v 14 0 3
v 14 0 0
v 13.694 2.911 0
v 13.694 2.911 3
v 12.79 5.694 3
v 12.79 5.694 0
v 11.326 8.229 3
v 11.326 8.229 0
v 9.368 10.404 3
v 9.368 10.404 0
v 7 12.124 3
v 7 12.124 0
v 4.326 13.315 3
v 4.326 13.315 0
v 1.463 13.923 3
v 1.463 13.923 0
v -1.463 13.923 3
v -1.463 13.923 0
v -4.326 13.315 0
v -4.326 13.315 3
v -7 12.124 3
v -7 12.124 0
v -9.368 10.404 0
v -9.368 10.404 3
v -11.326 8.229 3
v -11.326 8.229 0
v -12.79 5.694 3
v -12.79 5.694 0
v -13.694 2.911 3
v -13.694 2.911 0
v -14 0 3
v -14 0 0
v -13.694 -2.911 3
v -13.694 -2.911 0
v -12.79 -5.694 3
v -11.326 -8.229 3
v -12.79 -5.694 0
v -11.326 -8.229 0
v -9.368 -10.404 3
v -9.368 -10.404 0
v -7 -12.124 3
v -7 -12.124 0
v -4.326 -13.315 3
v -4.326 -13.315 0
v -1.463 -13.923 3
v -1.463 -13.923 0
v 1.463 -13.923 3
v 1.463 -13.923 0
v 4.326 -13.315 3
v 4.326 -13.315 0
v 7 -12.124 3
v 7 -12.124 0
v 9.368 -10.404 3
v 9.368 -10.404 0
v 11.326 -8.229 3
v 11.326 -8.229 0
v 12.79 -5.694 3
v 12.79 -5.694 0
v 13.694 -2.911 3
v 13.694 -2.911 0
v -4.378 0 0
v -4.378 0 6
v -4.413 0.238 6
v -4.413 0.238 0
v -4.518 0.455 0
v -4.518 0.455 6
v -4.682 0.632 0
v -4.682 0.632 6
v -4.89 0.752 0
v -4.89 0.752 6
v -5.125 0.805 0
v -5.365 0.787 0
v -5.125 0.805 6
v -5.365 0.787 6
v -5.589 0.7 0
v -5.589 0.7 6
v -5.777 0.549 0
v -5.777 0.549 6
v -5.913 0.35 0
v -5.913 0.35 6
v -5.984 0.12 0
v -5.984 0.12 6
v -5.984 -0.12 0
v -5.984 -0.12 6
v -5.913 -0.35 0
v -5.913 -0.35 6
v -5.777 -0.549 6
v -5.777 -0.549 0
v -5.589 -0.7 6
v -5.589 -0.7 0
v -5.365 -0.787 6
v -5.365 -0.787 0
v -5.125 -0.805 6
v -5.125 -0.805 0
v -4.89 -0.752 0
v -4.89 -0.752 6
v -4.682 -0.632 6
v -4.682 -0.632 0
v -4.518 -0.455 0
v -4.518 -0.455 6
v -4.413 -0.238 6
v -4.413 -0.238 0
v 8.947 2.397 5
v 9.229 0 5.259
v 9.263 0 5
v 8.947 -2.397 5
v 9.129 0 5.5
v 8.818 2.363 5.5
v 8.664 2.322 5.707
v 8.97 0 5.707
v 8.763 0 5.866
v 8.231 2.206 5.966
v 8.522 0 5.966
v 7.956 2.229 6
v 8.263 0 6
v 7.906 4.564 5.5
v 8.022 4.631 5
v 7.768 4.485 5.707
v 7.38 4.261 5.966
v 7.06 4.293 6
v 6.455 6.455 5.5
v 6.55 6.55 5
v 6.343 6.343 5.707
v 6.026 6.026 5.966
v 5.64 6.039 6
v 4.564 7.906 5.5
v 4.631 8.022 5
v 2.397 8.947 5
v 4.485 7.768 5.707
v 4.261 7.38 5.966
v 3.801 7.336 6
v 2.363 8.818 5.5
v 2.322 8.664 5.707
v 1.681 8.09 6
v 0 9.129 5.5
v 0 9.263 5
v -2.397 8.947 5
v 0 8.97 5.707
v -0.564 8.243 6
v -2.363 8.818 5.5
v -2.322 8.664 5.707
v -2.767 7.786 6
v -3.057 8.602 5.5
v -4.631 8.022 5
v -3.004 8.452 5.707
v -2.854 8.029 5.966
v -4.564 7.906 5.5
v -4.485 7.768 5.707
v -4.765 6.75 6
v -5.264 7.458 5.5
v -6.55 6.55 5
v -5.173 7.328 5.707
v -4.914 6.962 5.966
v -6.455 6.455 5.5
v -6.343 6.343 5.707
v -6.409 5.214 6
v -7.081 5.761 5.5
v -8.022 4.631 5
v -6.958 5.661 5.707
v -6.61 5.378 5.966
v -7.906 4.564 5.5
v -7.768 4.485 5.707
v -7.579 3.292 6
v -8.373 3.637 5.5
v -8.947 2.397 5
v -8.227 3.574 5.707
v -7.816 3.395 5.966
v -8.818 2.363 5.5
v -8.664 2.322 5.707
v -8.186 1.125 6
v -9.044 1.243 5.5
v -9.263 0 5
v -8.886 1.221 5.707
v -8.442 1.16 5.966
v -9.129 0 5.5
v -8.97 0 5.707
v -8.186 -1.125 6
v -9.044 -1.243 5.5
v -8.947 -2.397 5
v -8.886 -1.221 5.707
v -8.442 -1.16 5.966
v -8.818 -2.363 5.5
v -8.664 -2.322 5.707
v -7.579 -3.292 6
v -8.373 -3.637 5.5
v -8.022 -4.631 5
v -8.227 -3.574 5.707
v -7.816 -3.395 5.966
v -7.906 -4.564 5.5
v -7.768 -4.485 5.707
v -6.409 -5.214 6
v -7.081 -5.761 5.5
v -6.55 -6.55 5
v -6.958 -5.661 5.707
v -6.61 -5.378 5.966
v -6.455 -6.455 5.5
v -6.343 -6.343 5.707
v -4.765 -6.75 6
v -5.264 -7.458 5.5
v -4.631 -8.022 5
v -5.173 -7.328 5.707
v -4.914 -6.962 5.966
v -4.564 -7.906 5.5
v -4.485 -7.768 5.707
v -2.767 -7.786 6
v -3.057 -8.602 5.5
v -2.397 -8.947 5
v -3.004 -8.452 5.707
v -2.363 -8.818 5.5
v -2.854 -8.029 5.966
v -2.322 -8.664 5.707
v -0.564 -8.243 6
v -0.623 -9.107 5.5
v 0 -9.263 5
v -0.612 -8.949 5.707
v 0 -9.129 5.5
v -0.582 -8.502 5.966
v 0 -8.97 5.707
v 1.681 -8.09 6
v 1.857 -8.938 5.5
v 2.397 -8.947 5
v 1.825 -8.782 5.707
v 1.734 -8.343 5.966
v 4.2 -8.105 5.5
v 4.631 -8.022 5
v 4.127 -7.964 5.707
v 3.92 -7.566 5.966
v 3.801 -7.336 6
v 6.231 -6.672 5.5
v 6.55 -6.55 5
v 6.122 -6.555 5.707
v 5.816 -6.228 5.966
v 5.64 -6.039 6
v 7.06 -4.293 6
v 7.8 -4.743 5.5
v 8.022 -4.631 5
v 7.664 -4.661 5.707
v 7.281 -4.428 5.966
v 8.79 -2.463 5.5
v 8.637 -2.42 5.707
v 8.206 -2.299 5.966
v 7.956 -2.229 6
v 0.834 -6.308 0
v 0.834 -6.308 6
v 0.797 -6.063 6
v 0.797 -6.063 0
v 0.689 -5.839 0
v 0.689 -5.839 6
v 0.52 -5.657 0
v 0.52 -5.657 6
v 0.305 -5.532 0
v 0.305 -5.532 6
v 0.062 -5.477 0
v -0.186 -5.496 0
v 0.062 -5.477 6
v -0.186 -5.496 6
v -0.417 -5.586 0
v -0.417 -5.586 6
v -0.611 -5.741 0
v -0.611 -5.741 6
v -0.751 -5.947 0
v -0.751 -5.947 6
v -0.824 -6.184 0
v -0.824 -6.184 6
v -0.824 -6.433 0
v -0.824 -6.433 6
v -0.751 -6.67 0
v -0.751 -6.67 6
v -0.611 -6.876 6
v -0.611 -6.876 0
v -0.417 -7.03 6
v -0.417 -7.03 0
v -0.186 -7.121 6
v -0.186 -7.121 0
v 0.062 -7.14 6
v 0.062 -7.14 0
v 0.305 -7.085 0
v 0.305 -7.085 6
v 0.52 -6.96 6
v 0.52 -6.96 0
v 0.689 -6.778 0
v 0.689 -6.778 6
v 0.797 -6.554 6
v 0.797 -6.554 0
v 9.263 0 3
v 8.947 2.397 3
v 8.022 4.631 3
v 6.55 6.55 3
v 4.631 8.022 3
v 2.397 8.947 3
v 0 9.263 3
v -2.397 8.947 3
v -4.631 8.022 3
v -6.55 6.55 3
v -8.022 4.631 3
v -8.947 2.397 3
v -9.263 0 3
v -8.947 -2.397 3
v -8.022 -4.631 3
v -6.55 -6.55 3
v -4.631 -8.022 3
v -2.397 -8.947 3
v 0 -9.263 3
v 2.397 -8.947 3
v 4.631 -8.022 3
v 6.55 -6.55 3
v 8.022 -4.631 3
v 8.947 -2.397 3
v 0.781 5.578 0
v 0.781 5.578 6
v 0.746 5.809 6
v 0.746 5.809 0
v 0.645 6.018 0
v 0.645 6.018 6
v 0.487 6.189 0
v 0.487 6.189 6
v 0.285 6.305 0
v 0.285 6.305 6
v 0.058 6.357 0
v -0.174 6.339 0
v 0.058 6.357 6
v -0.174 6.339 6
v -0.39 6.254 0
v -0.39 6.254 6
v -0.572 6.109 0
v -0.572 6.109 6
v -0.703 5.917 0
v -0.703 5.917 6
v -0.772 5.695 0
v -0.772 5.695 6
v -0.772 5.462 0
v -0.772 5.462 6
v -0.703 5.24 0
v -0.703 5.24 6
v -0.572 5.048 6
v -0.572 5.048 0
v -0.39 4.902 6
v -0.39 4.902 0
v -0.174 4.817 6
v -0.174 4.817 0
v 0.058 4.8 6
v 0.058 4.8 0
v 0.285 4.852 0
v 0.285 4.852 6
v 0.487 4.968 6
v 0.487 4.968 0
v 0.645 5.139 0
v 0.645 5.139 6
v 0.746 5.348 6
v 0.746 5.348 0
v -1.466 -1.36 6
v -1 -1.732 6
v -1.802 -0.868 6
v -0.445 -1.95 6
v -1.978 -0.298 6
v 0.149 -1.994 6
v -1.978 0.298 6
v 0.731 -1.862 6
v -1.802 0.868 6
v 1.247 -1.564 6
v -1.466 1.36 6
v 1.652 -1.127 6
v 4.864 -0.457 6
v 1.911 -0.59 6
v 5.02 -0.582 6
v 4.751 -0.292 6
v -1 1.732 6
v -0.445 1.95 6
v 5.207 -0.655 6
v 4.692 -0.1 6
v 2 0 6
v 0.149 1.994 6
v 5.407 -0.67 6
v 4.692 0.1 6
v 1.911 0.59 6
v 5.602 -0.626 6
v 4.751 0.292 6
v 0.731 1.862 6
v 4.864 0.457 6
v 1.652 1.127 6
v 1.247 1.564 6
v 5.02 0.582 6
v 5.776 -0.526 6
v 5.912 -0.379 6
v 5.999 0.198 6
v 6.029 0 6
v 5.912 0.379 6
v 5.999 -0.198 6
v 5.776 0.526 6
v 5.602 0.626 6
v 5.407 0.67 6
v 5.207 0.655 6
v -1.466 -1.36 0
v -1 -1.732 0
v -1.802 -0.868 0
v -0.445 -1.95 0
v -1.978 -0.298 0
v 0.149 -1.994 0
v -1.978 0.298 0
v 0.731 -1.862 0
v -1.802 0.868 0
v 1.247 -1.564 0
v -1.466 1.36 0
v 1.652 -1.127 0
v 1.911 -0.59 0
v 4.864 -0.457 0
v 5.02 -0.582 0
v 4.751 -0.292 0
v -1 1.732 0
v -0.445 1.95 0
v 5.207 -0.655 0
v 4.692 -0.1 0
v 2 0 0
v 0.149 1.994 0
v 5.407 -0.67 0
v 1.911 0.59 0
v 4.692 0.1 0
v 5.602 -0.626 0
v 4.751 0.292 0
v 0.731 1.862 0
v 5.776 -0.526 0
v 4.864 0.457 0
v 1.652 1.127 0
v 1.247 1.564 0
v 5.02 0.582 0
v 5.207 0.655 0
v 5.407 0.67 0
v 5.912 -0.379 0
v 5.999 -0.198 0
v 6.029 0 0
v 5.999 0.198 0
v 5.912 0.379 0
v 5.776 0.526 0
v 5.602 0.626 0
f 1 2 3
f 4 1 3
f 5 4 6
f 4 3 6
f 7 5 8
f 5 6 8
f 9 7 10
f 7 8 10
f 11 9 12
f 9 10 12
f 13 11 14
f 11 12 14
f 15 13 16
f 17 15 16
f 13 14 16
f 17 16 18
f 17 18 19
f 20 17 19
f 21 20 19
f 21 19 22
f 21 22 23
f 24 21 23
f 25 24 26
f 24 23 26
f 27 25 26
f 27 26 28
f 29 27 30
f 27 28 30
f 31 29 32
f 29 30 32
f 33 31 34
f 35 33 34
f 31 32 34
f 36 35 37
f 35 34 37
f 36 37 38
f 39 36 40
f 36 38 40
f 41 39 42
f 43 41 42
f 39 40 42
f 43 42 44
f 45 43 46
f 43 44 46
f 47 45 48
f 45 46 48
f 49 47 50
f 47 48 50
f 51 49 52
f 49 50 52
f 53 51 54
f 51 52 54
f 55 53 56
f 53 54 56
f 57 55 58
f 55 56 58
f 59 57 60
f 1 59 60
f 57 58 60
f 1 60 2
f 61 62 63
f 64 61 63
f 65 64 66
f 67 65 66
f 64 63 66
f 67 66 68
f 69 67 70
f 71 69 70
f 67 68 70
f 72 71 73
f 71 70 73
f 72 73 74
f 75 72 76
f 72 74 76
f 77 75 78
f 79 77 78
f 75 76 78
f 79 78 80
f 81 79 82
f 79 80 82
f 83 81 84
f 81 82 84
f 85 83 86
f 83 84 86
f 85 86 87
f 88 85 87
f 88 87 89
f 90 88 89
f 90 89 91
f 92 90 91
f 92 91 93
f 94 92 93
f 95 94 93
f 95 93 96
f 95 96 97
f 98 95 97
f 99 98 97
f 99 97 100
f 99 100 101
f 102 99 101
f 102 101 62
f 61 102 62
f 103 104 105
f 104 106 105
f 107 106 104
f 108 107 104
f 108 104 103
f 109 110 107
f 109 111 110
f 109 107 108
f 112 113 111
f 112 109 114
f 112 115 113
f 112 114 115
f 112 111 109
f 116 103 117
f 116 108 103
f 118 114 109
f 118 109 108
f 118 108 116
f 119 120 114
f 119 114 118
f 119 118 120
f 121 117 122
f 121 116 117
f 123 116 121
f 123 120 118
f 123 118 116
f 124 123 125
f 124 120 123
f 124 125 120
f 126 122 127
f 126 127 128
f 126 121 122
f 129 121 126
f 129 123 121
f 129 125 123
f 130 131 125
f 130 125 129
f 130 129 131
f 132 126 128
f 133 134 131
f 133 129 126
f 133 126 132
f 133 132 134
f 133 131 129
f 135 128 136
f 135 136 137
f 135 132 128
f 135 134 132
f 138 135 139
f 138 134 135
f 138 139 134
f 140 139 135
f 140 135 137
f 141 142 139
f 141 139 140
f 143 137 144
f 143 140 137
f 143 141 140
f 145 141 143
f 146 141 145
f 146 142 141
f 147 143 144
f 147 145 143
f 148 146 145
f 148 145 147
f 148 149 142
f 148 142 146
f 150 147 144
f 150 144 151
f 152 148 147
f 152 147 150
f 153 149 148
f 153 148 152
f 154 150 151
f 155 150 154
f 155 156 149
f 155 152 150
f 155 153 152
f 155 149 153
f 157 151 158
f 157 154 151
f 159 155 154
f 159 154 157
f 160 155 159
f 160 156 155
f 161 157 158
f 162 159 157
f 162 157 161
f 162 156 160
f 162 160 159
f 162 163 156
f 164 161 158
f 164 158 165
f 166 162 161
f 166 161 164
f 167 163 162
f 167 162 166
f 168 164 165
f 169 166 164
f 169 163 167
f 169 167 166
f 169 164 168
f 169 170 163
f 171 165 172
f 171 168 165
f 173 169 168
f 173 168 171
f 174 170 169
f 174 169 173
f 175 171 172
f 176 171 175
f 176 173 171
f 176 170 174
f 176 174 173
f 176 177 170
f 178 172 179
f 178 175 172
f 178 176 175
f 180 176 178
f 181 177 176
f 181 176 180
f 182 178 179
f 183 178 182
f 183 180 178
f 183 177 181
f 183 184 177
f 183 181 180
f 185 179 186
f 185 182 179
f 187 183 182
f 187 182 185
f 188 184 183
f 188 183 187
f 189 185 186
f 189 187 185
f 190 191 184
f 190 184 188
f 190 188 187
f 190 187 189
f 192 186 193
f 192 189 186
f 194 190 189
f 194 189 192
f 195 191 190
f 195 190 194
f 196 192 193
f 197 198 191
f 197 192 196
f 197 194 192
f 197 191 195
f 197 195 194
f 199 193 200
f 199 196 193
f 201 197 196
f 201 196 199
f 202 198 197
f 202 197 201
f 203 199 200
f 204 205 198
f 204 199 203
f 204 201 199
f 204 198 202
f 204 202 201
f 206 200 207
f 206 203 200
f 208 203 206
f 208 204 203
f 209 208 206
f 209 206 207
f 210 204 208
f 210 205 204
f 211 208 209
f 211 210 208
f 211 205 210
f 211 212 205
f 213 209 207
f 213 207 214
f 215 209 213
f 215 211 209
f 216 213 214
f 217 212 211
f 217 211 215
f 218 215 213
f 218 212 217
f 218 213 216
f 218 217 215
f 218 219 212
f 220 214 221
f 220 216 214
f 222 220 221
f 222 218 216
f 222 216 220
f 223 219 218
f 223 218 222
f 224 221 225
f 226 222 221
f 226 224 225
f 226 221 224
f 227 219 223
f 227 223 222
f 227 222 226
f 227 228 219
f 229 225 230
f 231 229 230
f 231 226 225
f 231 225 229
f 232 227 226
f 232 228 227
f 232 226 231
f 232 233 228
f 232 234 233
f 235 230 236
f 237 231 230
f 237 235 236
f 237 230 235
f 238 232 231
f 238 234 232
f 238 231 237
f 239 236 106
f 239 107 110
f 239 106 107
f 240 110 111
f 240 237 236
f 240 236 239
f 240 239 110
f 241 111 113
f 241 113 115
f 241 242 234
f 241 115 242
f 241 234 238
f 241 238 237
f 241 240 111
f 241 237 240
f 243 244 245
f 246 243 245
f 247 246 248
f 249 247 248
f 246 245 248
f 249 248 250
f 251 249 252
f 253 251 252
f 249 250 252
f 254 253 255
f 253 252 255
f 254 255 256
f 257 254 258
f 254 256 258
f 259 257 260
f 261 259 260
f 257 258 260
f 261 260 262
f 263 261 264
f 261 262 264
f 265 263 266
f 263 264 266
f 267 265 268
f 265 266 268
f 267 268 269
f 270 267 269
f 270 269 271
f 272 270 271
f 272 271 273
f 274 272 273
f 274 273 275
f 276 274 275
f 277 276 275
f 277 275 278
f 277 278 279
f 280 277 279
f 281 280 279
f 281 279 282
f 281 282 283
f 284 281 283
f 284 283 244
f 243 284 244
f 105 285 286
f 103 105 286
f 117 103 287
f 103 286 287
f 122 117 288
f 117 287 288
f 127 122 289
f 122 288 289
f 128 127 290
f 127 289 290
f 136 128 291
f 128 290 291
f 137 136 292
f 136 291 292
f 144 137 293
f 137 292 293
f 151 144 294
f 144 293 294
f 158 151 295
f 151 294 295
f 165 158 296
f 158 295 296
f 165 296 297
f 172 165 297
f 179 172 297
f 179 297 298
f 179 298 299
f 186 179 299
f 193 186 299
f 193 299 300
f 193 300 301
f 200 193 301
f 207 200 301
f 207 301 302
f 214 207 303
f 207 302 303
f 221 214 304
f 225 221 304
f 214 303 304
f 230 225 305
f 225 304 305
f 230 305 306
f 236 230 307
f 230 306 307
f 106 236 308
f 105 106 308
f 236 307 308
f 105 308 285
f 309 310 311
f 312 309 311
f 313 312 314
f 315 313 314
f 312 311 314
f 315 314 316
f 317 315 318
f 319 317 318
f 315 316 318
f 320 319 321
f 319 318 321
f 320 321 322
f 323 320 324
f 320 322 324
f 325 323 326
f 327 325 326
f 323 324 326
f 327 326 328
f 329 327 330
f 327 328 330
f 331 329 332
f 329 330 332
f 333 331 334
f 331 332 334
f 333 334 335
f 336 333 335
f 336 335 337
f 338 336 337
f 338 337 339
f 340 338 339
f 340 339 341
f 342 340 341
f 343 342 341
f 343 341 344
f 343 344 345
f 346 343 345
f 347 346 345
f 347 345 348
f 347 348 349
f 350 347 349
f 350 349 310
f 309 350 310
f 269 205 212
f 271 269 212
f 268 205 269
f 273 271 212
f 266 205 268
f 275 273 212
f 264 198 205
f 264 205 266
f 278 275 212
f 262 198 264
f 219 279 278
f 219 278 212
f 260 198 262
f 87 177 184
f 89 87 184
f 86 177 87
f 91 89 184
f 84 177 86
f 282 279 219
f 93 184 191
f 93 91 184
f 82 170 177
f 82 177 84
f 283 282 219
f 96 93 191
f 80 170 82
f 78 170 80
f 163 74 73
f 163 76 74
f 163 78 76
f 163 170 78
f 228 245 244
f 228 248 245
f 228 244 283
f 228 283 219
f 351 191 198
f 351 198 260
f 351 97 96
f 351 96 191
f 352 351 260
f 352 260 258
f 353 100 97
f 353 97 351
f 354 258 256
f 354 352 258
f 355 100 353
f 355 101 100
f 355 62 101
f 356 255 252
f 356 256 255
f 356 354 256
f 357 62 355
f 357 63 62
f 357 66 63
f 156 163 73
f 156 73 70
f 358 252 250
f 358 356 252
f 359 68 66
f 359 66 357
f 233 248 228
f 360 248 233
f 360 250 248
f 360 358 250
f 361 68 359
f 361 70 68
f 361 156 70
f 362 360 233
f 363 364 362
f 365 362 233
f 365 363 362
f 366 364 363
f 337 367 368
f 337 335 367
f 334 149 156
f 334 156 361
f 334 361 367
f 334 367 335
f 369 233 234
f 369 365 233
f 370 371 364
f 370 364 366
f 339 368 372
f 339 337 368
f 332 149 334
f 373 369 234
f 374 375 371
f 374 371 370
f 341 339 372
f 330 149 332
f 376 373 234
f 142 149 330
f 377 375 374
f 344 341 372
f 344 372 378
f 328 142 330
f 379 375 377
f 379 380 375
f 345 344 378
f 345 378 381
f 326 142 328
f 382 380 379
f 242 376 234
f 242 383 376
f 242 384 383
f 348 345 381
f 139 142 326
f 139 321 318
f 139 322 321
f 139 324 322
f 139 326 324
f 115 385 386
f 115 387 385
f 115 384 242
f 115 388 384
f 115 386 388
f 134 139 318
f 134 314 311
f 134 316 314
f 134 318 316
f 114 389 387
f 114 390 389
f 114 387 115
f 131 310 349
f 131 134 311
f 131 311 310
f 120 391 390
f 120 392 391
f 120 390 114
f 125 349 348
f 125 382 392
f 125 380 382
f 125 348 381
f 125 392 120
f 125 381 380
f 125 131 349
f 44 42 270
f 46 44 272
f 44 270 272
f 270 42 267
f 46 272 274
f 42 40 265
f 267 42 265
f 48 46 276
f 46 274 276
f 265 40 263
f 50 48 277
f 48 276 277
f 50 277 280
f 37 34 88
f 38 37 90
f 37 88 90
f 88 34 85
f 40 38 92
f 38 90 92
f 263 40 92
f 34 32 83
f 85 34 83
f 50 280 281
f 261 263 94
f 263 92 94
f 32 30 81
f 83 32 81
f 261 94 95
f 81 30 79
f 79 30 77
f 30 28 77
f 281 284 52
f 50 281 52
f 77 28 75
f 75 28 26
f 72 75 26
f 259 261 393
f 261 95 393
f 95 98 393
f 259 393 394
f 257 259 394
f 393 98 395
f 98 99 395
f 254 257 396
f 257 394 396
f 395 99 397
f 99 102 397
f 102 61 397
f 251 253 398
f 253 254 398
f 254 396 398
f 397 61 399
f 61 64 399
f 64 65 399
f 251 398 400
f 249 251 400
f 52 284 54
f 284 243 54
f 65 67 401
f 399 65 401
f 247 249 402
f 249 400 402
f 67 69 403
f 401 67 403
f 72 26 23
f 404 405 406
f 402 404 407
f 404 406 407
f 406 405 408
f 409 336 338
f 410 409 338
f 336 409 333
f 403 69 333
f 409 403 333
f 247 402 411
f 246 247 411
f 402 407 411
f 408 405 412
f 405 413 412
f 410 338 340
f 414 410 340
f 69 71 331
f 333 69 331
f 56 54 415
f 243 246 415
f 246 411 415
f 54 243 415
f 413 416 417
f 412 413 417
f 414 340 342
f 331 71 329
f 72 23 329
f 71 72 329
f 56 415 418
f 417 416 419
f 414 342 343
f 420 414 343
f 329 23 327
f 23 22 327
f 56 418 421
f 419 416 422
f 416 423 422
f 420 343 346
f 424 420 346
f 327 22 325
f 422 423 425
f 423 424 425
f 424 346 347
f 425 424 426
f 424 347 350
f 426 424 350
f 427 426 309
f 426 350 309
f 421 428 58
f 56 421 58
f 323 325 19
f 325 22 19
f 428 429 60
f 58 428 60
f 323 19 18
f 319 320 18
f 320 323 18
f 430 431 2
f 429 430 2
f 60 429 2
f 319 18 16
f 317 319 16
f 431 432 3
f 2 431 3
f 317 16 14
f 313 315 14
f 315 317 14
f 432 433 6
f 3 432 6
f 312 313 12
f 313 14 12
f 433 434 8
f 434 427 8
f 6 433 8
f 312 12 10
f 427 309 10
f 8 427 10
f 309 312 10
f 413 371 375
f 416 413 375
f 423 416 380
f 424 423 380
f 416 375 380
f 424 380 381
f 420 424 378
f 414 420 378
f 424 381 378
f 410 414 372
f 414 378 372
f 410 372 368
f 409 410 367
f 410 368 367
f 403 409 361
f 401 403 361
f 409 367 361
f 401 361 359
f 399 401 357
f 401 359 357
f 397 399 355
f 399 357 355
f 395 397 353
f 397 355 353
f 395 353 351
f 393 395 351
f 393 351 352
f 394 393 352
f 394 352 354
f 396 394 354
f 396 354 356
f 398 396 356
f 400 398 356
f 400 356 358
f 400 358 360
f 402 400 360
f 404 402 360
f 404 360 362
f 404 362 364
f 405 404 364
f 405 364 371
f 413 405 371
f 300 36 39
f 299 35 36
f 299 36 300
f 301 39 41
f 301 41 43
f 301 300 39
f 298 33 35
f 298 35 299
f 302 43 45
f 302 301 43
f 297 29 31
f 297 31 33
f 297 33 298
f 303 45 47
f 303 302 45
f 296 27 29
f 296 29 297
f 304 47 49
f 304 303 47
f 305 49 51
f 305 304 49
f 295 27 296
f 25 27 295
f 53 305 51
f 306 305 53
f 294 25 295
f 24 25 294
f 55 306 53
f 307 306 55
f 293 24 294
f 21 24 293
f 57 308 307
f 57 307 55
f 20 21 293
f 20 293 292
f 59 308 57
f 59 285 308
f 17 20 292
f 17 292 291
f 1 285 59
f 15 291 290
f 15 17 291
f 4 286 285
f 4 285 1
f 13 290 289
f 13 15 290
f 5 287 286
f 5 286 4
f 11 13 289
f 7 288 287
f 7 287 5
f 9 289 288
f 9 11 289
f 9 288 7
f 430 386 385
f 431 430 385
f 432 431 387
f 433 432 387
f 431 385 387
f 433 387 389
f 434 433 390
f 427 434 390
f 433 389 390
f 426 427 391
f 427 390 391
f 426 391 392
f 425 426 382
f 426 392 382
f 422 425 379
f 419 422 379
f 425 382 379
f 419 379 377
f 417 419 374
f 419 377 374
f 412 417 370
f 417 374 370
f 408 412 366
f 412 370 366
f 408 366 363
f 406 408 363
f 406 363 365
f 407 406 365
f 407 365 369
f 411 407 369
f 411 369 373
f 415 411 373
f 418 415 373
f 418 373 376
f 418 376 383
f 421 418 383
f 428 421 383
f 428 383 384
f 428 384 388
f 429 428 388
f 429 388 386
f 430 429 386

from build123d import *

# Parameters (mm, degrees)
F0_R     = 14
F1_DEPTH = 3
F2_R     = 9.262684
F3_DEPTH = 3
F4_R     = 2
F5_DEPTH = 30
F6_R     = 0.780538
F6_R_2   = 0.67232
F6_R_3   = 0.833775
F6_R_4   = 0.807745
F7_DEPTH = 25.4
F8_R     = 1


with BuildPart() as f1:
    # F0 (on Top) → F1 (new body)
    with BuildSketch(Plane.XY):
        Circle(F0_R)
    extrude(amount=F1_DEPTH)

    # F2 (on face) → F3 (join)
    with BuildSketch(Plane.XY.offset(3)):
        Circle(F2_R)
    extrude(amount=F3_DEPTH)

    # F4 (on face) → F5 (cut)
    with BuildSketch(Plane.XY.offset(6)):
        Circle(F4_R)
    extrude(amount=-F5_DEPTH, mode=Mode.SUBTRACT)

    # F6 (on face) → F7 (cut)
    with BuildSketch(Plane.XY.offset(6)):
        with Locations((0, 5.578444)):
            Circle(F6_R)
        with Locations((5.356538, 0)):
            Circle(F6_R_2)
        with Locations((0, -6.308428)):
            Circle(F6_R_3)
        with Locations((-5.185302, 0)):
            Circle(F6_R_4)
    extrude(amount=-F7_DEPTH, mode=Mode.SUBTRACT)

    # F8
    f8_edges = [f1.edges().sort_by_distance(p)[0] for p in [
        (-9.262684, 0, 6),
    ]]
    fillet(f8_edges, radius=F8_R)


solid = f1.part
